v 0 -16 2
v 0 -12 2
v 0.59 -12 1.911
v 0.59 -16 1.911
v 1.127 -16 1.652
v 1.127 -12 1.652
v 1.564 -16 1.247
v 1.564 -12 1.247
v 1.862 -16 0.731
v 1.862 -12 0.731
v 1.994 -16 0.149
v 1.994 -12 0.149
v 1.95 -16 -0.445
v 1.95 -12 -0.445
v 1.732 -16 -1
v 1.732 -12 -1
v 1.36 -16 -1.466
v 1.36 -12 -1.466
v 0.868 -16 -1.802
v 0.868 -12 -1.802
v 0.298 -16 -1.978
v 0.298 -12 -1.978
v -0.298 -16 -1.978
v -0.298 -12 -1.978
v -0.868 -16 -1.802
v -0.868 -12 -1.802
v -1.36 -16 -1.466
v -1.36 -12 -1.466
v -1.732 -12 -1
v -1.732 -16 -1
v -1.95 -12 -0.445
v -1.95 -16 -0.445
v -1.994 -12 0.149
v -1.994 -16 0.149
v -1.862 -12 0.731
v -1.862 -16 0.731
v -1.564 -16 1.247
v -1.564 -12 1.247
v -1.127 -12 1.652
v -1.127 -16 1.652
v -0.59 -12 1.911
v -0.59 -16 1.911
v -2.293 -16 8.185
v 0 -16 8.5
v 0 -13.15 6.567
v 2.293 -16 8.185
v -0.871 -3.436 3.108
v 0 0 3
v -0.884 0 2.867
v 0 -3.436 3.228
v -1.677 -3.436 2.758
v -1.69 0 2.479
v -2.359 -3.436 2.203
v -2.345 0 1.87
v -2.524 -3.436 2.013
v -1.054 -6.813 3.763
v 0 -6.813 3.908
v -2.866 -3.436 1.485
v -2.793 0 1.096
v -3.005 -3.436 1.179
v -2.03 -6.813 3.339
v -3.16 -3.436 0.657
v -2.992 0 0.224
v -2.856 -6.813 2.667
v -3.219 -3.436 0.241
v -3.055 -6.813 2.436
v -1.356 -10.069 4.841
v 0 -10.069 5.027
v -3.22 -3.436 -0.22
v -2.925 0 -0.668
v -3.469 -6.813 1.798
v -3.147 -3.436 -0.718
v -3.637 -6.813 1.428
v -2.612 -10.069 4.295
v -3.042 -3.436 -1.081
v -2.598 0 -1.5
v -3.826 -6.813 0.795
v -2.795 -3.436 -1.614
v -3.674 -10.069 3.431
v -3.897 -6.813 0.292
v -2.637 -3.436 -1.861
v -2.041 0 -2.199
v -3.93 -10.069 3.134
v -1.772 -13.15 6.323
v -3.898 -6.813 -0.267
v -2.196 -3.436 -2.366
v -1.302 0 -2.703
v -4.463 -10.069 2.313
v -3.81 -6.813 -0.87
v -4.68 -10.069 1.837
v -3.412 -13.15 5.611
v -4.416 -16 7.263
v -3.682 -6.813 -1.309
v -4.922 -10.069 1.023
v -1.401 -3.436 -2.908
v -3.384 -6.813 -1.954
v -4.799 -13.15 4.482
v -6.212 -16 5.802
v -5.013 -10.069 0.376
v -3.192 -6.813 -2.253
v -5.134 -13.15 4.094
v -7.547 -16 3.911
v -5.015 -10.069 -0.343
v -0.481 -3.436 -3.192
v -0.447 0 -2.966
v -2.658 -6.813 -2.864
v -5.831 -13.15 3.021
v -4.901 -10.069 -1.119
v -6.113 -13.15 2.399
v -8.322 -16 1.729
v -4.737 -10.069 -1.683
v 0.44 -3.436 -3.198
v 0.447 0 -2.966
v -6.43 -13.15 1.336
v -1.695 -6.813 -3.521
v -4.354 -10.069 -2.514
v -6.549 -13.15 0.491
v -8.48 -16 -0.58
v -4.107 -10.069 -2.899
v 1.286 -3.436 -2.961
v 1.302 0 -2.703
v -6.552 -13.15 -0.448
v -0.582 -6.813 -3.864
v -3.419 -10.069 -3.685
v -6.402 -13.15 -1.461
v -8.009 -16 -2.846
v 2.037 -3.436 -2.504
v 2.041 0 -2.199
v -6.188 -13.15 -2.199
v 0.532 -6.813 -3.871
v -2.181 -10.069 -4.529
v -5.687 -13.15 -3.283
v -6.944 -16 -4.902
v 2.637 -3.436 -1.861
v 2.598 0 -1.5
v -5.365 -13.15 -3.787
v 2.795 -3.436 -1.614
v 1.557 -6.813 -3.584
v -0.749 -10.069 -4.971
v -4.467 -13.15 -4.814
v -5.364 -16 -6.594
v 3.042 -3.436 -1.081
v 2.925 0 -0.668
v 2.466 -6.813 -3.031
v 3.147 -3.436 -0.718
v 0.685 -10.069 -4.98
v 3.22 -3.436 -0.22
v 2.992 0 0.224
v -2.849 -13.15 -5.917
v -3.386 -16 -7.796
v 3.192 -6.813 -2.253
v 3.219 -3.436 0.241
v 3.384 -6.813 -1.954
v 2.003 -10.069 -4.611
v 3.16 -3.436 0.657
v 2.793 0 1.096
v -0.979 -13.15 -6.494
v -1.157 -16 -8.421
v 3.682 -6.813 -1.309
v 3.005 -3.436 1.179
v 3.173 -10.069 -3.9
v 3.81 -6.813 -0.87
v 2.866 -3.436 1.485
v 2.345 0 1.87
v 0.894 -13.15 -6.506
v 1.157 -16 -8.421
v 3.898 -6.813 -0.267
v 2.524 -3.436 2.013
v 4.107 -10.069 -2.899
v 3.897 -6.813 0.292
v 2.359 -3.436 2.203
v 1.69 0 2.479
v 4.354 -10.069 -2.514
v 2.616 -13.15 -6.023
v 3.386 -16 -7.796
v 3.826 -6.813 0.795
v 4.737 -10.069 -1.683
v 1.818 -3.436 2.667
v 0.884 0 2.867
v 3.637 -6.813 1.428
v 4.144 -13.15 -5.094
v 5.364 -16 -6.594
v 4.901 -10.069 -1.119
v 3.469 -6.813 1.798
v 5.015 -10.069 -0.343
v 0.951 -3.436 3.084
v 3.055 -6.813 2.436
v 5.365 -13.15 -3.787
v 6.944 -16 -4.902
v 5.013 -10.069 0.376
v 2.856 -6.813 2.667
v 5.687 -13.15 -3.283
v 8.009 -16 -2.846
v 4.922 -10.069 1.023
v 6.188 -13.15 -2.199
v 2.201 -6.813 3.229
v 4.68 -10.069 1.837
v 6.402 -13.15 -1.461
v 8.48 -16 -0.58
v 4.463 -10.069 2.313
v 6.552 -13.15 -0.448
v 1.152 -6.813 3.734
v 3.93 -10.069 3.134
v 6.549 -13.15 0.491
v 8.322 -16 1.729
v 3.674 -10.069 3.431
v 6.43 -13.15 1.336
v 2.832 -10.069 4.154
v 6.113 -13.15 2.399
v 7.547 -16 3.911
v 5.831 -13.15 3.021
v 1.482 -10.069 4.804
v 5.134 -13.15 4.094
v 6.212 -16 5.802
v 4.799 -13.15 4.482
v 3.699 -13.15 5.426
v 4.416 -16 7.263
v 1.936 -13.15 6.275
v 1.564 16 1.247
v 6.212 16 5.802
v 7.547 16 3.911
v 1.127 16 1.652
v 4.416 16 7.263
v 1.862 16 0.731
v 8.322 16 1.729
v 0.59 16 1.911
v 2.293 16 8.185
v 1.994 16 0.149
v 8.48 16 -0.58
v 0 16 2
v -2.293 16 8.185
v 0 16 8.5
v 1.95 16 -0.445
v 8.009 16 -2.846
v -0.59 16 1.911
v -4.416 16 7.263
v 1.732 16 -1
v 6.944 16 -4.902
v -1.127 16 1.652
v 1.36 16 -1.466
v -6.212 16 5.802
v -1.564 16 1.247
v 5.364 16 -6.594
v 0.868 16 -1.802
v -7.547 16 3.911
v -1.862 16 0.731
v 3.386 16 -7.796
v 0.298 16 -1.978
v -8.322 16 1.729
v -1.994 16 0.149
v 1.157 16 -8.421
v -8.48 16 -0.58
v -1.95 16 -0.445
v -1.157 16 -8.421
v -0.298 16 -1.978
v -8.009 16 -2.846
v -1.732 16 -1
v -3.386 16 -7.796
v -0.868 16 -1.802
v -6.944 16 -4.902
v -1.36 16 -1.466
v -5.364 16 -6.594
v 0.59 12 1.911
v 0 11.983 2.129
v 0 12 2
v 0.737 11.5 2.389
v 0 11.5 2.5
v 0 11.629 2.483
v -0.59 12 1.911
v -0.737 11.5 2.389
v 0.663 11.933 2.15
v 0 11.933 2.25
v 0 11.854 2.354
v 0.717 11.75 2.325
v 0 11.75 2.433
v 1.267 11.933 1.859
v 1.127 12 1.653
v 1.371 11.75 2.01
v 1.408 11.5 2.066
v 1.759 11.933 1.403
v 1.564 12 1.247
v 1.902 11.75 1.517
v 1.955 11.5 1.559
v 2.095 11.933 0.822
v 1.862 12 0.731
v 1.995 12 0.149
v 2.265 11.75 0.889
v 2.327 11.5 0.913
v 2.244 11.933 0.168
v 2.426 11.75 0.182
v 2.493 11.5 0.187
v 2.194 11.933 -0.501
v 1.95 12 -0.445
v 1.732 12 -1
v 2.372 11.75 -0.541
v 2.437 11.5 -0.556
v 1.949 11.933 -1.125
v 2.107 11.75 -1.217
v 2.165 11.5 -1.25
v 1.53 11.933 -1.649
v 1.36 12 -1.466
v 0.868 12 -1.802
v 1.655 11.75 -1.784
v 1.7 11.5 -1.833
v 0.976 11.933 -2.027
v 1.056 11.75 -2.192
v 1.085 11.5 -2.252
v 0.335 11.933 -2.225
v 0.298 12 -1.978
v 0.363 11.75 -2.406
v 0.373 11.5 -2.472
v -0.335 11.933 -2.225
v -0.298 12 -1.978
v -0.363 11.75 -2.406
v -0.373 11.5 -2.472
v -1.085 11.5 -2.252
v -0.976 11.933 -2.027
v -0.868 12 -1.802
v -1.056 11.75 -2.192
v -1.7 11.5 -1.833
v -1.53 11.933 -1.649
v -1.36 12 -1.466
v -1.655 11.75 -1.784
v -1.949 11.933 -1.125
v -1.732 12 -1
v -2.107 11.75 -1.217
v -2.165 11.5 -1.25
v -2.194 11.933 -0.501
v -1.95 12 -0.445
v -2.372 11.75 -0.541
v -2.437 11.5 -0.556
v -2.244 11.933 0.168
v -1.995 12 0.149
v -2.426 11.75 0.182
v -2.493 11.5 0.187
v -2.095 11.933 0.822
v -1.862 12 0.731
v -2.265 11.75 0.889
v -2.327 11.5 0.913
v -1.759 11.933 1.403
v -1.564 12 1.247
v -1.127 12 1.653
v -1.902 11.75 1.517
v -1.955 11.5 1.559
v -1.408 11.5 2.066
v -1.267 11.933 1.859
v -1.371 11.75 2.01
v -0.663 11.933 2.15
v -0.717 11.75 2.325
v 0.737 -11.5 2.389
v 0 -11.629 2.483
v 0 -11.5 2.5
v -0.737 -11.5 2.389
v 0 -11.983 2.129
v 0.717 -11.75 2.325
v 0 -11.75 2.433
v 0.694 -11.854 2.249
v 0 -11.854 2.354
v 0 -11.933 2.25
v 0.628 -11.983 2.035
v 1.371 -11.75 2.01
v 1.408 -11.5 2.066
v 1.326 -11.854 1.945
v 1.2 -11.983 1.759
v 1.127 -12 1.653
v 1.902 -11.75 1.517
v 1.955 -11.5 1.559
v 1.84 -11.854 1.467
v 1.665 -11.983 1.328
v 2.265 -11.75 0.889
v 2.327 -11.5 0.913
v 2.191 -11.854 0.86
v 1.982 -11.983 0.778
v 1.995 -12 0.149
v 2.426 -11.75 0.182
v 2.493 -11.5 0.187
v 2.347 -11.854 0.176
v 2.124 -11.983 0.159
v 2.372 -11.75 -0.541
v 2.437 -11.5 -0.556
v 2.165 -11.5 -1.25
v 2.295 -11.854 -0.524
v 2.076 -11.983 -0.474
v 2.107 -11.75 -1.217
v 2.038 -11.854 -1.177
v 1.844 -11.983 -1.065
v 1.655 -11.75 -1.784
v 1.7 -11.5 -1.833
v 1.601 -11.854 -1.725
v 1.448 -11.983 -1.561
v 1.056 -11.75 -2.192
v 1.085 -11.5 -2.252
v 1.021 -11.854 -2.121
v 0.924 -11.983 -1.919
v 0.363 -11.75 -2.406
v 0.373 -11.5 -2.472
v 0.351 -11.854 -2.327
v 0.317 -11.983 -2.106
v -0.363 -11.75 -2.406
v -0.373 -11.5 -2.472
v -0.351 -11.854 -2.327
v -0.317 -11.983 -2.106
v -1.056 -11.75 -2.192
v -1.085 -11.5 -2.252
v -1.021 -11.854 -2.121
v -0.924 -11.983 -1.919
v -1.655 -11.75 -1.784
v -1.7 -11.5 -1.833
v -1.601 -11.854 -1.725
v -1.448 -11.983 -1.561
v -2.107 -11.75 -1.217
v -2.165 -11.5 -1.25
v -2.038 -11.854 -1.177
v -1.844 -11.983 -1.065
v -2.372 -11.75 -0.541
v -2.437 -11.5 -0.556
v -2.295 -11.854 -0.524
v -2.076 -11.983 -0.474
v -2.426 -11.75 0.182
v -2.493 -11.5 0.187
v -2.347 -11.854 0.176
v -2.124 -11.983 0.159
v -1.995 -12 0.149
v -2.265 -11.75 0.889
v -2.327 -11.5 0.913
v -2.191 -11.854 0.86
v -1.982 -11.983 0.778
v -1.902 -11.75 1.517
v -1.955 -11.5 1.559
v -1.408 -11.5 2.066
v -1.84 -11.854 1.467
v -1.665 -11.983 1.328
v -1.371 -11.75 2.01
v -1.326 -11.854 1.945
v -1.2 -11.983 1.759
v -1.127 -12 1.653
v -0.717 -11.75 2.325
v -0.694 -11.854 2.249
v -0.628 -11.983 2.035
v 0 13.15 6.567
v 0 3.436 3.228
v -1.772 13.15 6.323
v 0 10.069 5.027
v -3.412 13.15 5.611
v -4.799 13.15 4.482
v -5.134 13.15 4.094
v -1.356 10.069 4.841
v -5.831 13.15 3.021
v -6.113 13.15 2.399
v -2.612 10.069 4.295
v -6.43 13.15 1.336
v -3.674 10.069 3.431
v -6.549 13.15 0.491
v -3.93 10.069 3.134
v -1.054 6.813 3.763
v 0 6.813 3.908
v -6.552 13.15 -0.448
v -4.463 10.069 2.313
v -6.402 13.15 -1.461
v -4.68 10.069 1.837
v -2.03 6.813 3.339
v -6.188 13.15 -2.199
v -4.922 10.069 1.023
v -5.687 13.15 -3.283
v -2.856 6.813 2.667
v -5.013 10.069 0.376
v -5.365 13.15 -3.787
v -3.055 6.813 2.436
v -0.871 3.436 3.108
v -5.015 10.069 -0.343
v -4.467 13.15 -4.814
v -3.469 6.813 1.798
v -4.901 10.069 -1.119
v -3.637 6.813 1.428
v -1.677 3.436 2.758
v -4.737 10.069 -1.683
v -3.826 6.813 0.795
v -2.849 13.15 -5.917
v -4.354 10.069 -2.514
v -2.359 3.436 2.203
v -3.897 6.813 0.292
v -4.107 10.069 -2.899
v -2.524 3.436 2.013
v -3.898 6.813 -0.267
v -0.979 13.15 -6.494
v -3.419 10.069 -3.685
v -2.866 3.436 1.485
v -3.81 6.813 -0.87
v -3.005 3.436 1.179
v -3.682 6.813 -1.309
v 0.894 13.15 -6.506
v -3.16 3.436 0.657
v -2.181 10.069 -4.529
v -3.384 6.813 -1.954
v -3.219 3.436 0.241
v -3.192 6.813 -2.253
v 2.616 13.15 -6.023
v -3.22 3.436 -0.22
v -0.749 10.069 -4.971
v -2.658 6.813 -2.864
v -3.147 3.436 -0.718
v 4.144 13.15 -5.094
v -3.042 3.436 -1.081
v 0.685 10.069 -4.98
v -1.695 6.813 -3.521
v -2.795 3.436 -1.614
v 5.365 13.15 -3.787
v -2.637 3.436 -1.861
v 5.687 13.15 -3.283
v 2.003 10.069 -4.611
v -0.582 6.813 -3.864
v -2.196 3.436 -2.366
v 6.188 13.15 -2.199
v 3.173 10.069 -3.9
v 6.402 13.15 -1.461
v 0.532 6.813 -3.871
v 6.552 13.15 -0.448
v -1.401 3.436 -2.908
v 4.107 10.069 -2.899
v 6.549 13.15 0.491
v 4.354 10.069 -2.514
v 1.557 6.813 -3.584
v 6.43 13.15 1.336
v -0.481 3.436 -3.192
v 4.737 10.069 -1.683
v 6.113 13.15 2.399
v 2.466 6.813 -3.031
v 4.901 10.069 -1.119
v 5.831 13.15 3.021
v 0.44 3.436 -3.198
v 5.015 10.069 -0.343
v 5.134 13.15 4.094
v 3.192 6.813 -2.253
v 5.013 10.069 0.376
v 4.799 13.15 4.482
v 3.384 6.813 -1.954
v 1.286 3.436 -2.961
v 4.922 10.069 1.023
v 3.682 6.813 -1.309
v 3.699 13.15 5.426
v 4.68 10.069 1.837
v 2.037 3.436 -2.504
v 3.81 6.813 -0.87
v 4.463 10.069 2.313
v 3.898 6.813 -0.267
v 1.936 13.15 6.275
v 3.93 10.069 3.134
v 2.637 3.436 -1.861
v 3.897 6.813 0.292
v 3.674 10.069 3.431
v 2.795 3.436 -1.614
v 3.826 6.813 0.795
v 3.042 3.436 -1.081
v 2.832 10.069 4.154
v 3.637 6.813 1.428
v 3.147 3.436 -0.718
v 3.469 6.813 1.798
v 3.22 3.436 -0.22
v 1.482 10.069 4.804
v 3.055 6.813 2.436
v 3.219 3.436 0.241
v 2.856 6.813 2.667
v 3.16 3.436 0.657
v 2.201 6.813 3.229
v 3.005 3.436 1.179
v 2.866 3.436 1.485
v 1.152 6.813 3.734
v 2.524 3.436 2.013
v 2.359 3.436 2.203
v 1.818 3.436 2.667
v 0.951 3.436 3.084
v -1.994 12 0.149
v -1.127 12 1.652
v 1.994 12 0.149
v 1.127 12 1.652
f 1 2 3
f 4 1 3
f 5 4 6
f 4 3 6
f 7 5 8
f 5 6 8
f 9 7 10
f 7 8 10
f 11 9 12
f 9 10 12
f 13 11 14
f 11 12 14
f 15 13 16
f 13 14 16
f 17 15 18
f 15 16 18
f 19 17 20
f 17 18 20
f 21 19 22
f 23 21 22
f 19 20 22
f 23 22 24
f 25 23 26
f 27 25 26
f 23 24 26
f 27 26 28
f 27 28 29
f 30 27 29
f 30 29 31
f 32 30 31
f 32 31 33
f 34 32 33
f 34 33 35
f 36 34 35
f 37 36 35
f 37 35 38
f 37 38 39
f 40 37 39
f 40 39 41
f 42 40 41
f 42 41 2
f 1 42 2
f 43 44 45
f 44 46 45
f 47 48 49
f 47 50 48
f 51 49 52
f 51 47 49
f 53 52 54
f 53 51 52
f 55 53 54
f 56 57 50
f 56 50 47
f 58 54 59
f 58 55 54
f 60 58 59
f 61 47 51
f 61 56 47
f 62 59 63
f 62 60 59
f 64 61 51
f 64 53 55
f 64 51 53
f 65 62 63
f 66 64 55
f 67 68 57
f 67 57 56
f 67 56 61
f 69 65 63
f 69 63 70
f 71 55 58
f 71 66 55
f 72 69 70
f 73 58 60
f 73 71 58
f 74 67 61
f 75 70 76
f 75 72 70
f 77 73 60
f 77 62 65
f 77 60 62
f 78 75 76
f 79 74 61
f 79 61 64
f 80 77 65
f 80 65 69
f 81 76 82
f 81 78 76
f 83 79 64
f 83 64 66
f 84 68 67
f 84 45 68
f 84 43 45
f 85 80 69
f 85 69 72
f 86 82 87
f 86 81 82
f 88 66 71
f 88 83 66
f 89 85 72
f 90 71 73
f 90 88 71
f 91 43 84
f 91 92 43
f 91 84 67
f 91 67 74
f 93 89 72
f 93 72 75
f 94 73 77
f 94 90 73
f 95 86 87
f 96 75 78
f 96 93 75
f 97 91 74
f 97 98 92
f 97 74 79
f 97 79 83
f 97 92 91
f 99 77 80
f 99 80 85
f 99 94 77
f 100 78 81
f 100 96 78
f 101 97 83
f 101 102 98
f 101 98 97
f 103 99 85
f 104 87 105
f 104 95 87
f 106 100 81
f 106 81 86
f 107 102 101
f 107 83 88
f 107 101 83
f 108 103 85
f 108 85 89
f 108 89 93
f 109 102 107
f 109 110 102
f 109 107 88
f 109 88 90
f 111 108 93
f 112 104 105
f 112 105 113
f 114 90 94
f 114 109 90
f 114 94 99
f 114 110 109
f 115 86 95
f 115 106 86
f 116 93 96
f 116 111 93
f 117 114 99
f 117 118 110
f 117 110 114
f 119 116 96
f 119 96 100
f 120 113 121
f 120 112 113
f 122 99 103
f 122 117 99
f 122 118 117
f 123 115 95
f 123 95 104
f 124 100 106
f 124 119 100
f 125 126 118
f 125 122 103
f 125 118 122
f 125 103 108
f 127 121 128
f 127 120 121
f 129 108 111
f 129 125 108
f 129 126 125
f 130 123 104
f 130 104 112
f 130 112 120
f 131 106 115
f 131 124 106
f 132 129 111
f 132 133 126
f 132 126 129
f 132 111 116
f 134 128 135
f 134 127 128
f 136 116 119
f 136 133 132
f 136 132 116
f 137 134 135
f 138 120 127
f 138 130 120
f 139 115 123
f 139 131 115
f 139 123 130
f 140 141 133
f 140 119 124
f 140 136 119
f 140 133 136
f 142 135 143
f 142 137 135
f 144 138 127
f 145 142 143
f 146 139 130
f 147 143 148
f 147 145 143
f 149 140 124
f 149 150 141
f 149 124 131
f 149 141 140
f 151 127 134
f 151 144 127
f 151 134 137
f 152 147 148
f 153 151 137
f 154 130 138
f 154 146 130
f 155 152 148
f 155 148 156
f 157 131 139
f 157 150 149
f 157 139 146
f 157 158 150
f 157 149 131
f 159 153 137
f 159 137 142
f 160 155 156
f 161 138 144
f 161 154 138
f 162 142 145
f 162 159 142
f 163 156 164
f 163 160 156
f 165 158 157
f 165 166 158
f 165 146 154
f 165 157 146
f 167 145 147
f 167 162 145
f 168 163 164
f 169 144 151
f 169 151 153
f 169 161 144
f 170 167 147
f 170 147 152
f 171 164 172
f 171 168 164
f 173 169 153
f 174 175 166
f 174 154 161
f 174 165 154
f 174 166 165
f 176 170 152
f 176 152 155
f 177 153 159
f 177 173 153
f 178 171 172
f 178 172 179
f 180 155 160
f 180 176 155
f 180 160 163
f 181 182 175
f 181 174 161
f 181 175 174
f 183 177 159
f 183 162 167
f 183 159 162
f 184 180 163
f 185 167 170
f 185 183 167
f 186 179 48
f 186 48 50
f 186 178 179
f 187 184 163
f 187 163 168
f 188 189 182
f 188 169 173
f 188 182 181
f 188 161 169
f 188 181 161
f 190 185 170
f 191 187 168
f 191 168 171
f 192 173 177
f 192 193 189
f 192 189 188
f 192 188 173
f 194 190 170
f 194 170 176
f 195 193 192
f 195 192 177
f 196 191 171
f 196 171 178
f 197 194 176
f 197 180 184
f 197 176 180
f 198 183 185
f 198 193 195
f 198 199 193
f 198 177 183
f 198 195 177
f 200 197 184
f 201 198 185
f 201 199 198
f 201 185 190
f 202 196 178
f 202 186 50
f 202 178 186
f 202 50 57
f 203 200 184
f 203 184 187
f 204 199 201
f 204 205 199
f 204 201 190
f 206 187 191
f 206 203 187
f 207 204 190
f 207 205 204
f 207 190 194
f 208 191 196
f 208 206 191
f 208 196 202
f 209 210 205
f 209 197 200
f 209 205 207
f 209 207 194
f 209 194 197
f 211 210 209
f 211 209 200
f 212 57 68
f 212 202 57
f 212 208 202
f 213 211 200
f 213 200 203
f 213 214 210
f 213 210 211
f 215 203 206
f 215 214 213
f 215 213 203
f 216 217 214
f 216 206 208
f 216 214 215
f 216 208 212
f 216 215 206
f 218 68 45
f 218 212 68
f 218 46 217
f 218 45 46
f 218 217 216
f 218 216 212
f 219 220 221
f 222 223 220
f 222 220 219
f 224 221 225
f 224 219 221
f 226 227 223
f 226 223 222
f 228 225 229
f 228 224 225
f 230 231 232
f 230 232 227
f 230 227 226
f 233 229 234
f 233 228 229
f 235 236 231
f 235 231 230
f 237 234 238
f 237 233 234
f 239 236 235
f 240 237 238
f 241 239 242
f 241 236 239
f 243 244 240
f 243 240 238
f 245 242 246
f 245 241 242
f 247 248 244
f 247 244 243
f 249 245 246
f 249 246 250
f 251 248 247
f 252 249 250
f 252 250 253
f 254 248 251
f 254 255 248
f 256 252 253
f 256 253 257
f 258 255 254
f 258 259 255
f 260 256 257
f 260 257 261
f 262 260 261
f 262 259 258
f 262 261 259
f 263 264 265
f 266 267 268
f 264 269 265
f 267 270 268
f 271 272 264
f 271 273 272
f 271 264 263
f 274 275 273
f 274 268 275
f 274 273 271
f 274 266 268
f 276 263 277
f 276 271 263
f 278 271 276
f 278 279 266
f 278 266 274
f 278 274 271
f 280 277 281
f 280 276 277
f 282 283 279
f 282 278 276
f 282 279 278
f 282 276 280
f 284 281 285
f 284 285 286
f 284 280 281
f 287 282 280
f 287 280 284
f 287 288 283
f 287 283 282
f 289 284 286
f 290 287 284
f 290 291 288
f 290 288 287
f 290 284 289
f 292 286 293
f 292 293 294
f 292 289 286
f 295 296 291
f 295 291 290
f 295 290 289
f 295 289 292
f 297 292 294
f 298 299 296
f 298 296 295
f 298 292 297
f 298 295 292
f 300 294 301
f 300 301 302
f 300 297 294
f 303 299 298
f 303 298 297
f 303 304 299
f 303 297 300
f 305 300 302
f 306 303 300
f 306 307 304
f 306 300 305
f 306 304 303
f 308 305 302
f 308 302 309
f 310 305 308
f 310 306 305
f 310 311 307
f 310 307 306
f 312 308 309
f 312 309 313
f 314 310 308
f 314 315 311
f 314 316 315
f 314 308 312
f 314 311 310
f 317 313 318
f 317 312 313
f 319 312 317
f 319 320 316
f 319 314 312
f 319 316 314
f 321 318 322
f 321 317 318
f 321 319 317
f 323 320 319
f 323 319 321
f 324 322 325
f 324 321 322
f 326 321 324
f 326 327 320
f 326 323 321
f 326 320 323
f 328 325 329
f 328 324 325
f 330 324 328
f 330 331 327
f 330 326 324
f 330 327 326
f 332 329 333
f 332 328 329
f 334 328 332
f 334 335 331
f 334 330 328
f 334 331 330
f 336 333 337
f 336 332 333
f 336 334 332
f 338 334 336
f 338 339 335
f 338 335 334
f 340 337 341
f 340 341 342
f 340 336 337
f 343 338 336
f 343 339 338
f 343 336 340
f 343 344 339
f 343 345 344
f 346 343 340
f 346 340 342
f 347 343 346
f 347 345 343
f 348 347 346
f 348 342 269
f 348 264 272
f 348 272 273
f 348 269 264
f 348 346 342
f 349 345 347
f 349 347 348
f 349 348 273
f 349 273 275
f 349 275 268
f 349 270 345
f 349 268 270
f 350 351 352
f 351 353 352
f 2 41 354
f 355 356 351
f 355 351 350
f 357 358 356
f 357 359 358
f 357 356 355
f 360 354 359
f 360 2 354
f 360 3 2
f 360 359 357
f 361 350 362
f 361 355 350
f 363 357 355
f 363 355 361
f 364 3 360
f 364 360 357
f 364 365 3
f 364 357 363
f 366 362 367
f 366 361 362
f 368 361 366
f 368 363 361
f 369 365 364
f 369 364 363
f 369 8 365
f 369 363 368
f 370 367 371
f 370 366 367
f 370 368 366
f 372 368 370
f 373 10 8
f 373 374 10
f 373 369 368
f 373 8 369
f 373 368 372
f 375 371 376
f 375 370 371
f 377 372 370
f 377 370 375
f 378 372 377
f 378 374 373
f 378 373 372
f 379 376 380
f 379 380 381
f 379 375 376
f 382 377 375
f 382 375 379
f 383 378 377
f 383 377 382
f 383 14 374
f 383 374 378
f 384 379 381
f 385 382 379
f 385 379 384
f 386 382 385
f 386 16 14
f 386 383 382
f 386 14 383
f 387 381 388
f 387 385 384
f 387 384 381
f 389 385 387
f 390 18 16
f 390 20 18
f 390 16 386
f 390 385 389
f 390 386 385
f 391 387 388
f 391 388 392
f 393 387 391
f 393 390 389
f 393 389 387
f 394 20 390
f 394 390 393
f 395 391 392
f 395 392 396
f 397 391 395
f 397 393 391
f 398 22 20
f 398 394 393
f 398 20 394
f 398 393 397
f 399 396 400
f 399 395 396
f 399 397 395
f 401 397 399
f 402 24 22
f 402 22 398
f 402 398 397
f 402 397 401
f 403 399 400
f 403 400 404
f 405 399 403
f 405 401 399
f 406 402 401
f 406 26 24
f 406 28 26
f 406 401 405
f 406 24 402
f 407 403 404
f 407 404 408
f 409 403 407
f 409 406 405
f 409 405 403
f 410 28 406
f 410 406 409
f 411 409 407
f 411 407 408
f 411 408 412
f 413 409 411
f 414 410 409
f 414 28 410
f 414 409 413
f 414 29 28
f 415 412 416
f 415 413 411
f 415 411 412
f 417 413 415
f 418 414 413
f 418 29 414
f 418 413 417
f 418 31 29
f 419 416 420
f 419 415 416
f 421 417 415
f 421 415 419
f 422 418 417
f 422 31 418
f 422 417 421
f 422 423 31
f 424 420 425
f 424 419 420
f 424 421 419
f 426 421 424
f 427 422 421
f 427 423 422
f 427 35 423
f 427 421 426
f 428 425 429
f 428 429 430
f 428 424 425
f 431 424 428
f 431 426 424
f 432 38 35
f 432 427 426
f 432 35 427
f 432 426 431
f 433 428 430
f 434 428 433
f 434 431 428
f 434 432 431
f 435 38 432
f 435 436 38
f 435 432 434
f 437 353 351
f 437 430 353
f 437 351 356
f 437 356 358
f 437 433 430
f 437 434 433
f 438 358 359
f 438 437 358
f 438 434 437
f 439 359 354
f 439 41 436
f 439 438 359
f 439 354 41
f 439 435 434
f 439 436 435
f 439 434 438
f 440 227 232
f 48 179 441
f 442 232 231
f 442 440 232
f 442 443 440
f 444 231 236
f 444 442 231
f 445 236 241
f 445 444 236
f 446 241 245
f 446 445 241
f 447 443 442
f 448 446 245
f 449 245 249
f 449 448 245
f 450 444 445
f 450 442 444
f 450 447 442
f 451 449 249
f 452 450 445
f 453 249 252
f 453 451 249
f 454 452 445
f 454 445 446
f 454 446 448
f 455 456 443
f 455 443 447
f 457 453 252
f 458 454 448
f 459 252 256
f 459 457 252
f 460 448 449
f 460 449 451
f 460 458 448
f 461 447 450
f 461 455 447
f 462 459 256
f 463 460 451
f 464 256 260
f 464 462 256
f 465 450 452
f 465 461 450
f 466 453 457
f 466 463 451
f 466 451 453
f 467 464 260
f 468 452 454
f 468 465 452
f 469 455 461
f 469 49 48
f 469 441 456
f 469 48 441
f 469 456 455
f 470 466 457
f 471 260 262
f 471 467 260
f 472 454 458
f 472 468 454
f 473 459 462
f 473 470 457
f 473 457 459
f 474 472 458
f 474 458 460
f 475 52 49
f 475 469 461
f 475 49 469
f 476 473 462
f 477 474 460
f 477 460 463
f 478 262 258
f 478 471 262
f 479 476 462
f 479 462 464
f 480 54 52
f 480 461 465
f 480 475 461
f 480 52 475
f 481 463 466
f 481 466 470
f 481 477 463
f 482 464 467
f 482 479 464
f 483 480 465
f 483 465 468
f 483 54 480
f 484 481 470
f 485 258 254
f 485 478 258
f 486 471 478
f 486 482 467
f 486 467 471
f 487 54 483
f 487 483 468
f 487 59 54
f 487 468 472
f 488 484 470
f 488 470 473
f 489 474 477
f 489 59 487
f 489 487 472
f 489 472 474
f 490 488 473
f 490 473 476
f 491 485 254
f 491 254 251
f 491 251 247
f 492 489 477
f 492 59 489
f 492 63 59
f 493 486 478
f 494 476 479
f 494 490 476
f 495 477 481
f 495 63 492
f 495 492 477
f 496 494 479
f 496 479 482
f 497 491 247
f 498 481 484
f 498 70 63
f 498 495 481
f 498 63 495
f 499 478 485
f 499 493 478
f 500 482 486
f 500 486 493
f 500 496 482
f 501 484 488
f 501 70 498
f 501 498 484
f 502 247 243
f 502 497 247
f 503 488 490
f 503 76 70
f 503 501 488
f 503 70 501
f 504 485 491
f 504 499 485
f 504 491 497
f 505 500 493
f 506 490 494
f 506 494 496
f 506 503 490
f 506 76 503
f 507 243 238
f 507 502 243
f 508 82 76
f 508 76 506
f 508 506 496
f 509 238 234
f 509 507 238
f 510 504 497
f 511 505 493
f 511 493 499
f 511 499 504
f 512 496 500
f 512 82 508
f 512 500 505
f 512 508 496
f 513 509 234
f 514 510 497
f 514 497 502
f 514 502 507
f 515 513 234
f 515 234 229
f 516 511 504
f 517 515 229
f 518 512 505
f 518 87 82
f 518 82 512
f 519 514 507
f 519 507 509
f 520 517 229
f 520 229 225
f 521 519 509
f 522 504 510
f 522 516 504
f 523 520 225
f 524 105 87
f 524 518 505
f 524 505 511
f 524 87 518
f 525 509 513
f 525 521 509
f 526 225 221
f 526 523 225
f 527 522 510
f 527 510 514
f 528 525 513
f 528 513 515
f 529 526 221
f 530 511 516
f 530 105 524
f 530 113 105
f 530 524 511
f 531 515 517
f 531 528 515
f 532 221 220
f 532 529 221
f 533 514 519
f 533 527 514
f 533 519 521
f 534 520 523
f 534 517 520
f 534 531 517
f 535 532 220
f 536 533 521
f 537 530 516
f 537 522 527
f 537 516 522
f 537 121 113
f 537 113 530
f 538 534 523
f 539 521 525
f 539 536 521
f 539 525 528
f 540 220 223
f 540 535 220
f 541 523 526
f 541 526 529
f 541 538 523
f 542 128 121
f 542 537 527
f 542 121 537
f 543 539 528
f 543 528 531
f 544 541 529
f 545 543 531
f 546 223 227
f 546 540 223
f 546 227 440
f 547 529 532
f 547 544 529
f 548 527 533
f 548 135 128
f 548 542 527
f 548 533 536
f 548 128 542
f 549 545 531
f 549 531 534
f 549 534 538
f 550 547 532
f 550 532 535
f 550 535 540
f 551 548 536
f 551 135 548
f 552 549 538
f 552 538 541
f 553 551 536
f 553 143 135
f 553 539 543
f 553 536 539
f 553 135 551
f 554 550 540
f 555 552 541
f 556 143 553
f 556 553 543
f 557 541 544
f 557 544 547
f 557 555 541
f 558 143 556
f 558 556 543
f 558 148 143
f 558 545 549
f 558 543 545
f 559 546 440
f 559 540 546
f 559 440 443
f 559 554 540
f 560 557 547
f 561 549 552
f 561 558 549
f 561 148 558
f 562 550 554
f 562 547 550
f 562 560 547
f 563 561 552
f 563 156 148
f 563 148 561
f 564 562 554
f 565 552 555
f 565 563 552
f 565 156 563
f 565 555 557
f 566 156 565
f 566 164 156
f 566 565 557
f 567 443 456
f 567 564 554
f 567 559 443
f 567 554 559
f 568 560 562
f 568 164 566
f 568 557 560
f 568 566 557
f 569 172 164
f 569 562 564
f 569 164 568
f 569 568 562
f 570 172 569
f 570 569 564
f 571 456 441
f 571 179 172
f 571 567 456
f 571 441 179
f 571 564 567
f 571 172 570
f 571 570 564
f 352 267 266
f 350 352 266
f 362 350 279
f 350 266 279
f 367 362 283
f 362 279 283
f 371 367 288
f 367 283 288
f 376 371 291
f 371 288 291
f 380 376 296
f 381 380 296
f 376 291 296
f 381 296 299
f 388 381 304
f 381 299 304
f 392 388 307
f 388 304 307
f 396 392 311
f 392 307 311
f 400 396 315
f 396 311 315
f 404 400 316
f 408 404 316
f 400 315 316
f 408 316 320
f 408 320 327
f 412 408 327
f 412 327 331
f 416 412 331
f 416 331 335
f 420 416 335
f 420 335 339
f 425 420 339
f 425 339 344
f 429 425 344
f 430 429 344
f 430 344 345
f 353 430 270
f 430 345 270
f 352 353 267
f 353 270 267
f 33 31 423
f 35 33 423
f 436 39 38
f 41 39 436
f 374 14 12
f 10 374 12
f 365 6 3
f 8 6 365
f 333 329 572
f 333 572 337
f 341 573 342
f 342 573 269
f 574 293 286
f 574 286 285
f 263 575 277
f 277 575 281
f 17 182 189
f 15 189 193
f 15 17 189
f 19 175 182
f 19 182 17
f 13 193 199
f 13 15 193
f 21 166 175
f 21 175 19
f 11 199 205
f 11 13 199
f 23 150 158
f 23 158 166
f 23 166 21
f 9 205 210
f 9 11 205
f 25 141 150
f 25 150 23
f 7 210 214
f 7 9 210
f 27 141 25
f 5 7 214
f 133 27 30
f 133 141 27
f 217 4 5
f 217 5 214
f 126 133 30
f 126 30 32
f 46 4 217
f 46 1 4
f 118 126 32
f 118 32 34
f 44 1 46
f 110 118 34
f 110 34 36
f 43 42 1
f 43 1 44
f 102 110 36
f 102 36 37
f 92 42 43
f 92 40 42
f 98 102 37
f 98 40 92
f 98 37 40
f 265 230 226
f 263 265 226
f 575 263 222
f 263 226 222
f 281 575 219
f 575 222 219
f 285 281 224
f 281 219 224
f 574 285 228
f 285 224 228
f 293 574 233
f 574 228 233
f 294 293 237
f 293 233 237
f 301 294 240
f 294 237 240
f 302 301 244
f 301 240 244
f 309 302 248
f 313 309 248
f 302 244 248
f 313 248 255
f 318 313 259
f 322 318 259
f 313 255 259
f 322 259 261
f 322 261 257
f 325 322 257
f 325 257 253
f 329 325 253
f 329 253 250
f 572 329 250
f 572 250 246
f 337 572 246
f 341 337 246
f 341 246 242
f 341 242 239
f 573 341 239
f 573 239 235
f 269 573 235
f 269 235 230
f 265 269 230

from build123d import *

# Parameters (mm, degrees)
SKETCH1_W          = 3
SKETCH1_H          = 32
SKETCH2_R          = 2
CUT_EXTRUDE1_DEPTH = 35.18332927
CUT_EXTRUDE2_START = -4
SKETCH3_R          = 2.5
CUT_EXTRUDE2_DEPTH = 24
FILLET1_R          = 0.5


with BuildPart() as part:
    # Sketch1 → Revolve1 (revolve)
    with BuildSketch(Plane.XY, mode=Mode.PRIVATE) as revolve1_sk:
        with BuildLine():
            Line((-3, -7e-08), (-3, 16))
            Line((-3, 16), (-8.5, 16))
            ThreePointArc((-8.5, 16), (-4.413382802, 8.459462125), (-3, -7e-08))
        make_face()
        with Locations((-1.5, 0)):
            Rectangle(SKETCH1_W, SKETCH1_H)
        with BuildLine():
            Line((-8.5, -16), (-3, -16))
            Line((-3, -16), (-3, -7e-08))
            ThreePointArc((-3, -7e-08), (-4.413382825, -8.459462191), (-8.5, -16))
        make_face()
    revolve(revolve1_sk.sketch.rotate(Axis((0, 16, 0), (0, -1, 0)), 270), axis=Axis((0, 16, 0), (0, -1, 0)))

    # Sketch2 → Cut-Extrude1 (cut, through all)
    with BuildSketch(Plane(origin=(0, 16, 0), x_dir=(1, 0, 0), z_dir=(0, 1, 0))):
        with Locations(Location((0, 0, 0), (0, 0, 270))):
            Circle(SKETCH2_R)
    extrude(amount=-CUT_EXTRUDE1_DEPTH, mode=Mode.SUBTRACT)

    # Sketch3 → Cut-Extrude2 (cut)
    with BuildSketch(Plane(origin=(0, 16, 0), x_dir=(1, 0, 0), z_dir=(0, 1, 0)).offset(CUT_EXTRUDE2_START)):
        with Locations(Location((0, 0, 0), (0, 0, 270))):
            Circle(SKETCH3_R)
    extrude(amount=-CUT_EXTRUDE2_DEPTH, mode=Mode.SUBTRACT)

    # Fillet1
    fillet1_edges = [part.edges().sort_by_distance(p)[0] for p in [
        (0, 12, -2.5),
        (0, -12, -2.5),
    ]]
    fillet(fillet1_edges, radius=FILLET1_R - 0.0001)  # a hair under: the kernel refuses the full size


solid = part.part
